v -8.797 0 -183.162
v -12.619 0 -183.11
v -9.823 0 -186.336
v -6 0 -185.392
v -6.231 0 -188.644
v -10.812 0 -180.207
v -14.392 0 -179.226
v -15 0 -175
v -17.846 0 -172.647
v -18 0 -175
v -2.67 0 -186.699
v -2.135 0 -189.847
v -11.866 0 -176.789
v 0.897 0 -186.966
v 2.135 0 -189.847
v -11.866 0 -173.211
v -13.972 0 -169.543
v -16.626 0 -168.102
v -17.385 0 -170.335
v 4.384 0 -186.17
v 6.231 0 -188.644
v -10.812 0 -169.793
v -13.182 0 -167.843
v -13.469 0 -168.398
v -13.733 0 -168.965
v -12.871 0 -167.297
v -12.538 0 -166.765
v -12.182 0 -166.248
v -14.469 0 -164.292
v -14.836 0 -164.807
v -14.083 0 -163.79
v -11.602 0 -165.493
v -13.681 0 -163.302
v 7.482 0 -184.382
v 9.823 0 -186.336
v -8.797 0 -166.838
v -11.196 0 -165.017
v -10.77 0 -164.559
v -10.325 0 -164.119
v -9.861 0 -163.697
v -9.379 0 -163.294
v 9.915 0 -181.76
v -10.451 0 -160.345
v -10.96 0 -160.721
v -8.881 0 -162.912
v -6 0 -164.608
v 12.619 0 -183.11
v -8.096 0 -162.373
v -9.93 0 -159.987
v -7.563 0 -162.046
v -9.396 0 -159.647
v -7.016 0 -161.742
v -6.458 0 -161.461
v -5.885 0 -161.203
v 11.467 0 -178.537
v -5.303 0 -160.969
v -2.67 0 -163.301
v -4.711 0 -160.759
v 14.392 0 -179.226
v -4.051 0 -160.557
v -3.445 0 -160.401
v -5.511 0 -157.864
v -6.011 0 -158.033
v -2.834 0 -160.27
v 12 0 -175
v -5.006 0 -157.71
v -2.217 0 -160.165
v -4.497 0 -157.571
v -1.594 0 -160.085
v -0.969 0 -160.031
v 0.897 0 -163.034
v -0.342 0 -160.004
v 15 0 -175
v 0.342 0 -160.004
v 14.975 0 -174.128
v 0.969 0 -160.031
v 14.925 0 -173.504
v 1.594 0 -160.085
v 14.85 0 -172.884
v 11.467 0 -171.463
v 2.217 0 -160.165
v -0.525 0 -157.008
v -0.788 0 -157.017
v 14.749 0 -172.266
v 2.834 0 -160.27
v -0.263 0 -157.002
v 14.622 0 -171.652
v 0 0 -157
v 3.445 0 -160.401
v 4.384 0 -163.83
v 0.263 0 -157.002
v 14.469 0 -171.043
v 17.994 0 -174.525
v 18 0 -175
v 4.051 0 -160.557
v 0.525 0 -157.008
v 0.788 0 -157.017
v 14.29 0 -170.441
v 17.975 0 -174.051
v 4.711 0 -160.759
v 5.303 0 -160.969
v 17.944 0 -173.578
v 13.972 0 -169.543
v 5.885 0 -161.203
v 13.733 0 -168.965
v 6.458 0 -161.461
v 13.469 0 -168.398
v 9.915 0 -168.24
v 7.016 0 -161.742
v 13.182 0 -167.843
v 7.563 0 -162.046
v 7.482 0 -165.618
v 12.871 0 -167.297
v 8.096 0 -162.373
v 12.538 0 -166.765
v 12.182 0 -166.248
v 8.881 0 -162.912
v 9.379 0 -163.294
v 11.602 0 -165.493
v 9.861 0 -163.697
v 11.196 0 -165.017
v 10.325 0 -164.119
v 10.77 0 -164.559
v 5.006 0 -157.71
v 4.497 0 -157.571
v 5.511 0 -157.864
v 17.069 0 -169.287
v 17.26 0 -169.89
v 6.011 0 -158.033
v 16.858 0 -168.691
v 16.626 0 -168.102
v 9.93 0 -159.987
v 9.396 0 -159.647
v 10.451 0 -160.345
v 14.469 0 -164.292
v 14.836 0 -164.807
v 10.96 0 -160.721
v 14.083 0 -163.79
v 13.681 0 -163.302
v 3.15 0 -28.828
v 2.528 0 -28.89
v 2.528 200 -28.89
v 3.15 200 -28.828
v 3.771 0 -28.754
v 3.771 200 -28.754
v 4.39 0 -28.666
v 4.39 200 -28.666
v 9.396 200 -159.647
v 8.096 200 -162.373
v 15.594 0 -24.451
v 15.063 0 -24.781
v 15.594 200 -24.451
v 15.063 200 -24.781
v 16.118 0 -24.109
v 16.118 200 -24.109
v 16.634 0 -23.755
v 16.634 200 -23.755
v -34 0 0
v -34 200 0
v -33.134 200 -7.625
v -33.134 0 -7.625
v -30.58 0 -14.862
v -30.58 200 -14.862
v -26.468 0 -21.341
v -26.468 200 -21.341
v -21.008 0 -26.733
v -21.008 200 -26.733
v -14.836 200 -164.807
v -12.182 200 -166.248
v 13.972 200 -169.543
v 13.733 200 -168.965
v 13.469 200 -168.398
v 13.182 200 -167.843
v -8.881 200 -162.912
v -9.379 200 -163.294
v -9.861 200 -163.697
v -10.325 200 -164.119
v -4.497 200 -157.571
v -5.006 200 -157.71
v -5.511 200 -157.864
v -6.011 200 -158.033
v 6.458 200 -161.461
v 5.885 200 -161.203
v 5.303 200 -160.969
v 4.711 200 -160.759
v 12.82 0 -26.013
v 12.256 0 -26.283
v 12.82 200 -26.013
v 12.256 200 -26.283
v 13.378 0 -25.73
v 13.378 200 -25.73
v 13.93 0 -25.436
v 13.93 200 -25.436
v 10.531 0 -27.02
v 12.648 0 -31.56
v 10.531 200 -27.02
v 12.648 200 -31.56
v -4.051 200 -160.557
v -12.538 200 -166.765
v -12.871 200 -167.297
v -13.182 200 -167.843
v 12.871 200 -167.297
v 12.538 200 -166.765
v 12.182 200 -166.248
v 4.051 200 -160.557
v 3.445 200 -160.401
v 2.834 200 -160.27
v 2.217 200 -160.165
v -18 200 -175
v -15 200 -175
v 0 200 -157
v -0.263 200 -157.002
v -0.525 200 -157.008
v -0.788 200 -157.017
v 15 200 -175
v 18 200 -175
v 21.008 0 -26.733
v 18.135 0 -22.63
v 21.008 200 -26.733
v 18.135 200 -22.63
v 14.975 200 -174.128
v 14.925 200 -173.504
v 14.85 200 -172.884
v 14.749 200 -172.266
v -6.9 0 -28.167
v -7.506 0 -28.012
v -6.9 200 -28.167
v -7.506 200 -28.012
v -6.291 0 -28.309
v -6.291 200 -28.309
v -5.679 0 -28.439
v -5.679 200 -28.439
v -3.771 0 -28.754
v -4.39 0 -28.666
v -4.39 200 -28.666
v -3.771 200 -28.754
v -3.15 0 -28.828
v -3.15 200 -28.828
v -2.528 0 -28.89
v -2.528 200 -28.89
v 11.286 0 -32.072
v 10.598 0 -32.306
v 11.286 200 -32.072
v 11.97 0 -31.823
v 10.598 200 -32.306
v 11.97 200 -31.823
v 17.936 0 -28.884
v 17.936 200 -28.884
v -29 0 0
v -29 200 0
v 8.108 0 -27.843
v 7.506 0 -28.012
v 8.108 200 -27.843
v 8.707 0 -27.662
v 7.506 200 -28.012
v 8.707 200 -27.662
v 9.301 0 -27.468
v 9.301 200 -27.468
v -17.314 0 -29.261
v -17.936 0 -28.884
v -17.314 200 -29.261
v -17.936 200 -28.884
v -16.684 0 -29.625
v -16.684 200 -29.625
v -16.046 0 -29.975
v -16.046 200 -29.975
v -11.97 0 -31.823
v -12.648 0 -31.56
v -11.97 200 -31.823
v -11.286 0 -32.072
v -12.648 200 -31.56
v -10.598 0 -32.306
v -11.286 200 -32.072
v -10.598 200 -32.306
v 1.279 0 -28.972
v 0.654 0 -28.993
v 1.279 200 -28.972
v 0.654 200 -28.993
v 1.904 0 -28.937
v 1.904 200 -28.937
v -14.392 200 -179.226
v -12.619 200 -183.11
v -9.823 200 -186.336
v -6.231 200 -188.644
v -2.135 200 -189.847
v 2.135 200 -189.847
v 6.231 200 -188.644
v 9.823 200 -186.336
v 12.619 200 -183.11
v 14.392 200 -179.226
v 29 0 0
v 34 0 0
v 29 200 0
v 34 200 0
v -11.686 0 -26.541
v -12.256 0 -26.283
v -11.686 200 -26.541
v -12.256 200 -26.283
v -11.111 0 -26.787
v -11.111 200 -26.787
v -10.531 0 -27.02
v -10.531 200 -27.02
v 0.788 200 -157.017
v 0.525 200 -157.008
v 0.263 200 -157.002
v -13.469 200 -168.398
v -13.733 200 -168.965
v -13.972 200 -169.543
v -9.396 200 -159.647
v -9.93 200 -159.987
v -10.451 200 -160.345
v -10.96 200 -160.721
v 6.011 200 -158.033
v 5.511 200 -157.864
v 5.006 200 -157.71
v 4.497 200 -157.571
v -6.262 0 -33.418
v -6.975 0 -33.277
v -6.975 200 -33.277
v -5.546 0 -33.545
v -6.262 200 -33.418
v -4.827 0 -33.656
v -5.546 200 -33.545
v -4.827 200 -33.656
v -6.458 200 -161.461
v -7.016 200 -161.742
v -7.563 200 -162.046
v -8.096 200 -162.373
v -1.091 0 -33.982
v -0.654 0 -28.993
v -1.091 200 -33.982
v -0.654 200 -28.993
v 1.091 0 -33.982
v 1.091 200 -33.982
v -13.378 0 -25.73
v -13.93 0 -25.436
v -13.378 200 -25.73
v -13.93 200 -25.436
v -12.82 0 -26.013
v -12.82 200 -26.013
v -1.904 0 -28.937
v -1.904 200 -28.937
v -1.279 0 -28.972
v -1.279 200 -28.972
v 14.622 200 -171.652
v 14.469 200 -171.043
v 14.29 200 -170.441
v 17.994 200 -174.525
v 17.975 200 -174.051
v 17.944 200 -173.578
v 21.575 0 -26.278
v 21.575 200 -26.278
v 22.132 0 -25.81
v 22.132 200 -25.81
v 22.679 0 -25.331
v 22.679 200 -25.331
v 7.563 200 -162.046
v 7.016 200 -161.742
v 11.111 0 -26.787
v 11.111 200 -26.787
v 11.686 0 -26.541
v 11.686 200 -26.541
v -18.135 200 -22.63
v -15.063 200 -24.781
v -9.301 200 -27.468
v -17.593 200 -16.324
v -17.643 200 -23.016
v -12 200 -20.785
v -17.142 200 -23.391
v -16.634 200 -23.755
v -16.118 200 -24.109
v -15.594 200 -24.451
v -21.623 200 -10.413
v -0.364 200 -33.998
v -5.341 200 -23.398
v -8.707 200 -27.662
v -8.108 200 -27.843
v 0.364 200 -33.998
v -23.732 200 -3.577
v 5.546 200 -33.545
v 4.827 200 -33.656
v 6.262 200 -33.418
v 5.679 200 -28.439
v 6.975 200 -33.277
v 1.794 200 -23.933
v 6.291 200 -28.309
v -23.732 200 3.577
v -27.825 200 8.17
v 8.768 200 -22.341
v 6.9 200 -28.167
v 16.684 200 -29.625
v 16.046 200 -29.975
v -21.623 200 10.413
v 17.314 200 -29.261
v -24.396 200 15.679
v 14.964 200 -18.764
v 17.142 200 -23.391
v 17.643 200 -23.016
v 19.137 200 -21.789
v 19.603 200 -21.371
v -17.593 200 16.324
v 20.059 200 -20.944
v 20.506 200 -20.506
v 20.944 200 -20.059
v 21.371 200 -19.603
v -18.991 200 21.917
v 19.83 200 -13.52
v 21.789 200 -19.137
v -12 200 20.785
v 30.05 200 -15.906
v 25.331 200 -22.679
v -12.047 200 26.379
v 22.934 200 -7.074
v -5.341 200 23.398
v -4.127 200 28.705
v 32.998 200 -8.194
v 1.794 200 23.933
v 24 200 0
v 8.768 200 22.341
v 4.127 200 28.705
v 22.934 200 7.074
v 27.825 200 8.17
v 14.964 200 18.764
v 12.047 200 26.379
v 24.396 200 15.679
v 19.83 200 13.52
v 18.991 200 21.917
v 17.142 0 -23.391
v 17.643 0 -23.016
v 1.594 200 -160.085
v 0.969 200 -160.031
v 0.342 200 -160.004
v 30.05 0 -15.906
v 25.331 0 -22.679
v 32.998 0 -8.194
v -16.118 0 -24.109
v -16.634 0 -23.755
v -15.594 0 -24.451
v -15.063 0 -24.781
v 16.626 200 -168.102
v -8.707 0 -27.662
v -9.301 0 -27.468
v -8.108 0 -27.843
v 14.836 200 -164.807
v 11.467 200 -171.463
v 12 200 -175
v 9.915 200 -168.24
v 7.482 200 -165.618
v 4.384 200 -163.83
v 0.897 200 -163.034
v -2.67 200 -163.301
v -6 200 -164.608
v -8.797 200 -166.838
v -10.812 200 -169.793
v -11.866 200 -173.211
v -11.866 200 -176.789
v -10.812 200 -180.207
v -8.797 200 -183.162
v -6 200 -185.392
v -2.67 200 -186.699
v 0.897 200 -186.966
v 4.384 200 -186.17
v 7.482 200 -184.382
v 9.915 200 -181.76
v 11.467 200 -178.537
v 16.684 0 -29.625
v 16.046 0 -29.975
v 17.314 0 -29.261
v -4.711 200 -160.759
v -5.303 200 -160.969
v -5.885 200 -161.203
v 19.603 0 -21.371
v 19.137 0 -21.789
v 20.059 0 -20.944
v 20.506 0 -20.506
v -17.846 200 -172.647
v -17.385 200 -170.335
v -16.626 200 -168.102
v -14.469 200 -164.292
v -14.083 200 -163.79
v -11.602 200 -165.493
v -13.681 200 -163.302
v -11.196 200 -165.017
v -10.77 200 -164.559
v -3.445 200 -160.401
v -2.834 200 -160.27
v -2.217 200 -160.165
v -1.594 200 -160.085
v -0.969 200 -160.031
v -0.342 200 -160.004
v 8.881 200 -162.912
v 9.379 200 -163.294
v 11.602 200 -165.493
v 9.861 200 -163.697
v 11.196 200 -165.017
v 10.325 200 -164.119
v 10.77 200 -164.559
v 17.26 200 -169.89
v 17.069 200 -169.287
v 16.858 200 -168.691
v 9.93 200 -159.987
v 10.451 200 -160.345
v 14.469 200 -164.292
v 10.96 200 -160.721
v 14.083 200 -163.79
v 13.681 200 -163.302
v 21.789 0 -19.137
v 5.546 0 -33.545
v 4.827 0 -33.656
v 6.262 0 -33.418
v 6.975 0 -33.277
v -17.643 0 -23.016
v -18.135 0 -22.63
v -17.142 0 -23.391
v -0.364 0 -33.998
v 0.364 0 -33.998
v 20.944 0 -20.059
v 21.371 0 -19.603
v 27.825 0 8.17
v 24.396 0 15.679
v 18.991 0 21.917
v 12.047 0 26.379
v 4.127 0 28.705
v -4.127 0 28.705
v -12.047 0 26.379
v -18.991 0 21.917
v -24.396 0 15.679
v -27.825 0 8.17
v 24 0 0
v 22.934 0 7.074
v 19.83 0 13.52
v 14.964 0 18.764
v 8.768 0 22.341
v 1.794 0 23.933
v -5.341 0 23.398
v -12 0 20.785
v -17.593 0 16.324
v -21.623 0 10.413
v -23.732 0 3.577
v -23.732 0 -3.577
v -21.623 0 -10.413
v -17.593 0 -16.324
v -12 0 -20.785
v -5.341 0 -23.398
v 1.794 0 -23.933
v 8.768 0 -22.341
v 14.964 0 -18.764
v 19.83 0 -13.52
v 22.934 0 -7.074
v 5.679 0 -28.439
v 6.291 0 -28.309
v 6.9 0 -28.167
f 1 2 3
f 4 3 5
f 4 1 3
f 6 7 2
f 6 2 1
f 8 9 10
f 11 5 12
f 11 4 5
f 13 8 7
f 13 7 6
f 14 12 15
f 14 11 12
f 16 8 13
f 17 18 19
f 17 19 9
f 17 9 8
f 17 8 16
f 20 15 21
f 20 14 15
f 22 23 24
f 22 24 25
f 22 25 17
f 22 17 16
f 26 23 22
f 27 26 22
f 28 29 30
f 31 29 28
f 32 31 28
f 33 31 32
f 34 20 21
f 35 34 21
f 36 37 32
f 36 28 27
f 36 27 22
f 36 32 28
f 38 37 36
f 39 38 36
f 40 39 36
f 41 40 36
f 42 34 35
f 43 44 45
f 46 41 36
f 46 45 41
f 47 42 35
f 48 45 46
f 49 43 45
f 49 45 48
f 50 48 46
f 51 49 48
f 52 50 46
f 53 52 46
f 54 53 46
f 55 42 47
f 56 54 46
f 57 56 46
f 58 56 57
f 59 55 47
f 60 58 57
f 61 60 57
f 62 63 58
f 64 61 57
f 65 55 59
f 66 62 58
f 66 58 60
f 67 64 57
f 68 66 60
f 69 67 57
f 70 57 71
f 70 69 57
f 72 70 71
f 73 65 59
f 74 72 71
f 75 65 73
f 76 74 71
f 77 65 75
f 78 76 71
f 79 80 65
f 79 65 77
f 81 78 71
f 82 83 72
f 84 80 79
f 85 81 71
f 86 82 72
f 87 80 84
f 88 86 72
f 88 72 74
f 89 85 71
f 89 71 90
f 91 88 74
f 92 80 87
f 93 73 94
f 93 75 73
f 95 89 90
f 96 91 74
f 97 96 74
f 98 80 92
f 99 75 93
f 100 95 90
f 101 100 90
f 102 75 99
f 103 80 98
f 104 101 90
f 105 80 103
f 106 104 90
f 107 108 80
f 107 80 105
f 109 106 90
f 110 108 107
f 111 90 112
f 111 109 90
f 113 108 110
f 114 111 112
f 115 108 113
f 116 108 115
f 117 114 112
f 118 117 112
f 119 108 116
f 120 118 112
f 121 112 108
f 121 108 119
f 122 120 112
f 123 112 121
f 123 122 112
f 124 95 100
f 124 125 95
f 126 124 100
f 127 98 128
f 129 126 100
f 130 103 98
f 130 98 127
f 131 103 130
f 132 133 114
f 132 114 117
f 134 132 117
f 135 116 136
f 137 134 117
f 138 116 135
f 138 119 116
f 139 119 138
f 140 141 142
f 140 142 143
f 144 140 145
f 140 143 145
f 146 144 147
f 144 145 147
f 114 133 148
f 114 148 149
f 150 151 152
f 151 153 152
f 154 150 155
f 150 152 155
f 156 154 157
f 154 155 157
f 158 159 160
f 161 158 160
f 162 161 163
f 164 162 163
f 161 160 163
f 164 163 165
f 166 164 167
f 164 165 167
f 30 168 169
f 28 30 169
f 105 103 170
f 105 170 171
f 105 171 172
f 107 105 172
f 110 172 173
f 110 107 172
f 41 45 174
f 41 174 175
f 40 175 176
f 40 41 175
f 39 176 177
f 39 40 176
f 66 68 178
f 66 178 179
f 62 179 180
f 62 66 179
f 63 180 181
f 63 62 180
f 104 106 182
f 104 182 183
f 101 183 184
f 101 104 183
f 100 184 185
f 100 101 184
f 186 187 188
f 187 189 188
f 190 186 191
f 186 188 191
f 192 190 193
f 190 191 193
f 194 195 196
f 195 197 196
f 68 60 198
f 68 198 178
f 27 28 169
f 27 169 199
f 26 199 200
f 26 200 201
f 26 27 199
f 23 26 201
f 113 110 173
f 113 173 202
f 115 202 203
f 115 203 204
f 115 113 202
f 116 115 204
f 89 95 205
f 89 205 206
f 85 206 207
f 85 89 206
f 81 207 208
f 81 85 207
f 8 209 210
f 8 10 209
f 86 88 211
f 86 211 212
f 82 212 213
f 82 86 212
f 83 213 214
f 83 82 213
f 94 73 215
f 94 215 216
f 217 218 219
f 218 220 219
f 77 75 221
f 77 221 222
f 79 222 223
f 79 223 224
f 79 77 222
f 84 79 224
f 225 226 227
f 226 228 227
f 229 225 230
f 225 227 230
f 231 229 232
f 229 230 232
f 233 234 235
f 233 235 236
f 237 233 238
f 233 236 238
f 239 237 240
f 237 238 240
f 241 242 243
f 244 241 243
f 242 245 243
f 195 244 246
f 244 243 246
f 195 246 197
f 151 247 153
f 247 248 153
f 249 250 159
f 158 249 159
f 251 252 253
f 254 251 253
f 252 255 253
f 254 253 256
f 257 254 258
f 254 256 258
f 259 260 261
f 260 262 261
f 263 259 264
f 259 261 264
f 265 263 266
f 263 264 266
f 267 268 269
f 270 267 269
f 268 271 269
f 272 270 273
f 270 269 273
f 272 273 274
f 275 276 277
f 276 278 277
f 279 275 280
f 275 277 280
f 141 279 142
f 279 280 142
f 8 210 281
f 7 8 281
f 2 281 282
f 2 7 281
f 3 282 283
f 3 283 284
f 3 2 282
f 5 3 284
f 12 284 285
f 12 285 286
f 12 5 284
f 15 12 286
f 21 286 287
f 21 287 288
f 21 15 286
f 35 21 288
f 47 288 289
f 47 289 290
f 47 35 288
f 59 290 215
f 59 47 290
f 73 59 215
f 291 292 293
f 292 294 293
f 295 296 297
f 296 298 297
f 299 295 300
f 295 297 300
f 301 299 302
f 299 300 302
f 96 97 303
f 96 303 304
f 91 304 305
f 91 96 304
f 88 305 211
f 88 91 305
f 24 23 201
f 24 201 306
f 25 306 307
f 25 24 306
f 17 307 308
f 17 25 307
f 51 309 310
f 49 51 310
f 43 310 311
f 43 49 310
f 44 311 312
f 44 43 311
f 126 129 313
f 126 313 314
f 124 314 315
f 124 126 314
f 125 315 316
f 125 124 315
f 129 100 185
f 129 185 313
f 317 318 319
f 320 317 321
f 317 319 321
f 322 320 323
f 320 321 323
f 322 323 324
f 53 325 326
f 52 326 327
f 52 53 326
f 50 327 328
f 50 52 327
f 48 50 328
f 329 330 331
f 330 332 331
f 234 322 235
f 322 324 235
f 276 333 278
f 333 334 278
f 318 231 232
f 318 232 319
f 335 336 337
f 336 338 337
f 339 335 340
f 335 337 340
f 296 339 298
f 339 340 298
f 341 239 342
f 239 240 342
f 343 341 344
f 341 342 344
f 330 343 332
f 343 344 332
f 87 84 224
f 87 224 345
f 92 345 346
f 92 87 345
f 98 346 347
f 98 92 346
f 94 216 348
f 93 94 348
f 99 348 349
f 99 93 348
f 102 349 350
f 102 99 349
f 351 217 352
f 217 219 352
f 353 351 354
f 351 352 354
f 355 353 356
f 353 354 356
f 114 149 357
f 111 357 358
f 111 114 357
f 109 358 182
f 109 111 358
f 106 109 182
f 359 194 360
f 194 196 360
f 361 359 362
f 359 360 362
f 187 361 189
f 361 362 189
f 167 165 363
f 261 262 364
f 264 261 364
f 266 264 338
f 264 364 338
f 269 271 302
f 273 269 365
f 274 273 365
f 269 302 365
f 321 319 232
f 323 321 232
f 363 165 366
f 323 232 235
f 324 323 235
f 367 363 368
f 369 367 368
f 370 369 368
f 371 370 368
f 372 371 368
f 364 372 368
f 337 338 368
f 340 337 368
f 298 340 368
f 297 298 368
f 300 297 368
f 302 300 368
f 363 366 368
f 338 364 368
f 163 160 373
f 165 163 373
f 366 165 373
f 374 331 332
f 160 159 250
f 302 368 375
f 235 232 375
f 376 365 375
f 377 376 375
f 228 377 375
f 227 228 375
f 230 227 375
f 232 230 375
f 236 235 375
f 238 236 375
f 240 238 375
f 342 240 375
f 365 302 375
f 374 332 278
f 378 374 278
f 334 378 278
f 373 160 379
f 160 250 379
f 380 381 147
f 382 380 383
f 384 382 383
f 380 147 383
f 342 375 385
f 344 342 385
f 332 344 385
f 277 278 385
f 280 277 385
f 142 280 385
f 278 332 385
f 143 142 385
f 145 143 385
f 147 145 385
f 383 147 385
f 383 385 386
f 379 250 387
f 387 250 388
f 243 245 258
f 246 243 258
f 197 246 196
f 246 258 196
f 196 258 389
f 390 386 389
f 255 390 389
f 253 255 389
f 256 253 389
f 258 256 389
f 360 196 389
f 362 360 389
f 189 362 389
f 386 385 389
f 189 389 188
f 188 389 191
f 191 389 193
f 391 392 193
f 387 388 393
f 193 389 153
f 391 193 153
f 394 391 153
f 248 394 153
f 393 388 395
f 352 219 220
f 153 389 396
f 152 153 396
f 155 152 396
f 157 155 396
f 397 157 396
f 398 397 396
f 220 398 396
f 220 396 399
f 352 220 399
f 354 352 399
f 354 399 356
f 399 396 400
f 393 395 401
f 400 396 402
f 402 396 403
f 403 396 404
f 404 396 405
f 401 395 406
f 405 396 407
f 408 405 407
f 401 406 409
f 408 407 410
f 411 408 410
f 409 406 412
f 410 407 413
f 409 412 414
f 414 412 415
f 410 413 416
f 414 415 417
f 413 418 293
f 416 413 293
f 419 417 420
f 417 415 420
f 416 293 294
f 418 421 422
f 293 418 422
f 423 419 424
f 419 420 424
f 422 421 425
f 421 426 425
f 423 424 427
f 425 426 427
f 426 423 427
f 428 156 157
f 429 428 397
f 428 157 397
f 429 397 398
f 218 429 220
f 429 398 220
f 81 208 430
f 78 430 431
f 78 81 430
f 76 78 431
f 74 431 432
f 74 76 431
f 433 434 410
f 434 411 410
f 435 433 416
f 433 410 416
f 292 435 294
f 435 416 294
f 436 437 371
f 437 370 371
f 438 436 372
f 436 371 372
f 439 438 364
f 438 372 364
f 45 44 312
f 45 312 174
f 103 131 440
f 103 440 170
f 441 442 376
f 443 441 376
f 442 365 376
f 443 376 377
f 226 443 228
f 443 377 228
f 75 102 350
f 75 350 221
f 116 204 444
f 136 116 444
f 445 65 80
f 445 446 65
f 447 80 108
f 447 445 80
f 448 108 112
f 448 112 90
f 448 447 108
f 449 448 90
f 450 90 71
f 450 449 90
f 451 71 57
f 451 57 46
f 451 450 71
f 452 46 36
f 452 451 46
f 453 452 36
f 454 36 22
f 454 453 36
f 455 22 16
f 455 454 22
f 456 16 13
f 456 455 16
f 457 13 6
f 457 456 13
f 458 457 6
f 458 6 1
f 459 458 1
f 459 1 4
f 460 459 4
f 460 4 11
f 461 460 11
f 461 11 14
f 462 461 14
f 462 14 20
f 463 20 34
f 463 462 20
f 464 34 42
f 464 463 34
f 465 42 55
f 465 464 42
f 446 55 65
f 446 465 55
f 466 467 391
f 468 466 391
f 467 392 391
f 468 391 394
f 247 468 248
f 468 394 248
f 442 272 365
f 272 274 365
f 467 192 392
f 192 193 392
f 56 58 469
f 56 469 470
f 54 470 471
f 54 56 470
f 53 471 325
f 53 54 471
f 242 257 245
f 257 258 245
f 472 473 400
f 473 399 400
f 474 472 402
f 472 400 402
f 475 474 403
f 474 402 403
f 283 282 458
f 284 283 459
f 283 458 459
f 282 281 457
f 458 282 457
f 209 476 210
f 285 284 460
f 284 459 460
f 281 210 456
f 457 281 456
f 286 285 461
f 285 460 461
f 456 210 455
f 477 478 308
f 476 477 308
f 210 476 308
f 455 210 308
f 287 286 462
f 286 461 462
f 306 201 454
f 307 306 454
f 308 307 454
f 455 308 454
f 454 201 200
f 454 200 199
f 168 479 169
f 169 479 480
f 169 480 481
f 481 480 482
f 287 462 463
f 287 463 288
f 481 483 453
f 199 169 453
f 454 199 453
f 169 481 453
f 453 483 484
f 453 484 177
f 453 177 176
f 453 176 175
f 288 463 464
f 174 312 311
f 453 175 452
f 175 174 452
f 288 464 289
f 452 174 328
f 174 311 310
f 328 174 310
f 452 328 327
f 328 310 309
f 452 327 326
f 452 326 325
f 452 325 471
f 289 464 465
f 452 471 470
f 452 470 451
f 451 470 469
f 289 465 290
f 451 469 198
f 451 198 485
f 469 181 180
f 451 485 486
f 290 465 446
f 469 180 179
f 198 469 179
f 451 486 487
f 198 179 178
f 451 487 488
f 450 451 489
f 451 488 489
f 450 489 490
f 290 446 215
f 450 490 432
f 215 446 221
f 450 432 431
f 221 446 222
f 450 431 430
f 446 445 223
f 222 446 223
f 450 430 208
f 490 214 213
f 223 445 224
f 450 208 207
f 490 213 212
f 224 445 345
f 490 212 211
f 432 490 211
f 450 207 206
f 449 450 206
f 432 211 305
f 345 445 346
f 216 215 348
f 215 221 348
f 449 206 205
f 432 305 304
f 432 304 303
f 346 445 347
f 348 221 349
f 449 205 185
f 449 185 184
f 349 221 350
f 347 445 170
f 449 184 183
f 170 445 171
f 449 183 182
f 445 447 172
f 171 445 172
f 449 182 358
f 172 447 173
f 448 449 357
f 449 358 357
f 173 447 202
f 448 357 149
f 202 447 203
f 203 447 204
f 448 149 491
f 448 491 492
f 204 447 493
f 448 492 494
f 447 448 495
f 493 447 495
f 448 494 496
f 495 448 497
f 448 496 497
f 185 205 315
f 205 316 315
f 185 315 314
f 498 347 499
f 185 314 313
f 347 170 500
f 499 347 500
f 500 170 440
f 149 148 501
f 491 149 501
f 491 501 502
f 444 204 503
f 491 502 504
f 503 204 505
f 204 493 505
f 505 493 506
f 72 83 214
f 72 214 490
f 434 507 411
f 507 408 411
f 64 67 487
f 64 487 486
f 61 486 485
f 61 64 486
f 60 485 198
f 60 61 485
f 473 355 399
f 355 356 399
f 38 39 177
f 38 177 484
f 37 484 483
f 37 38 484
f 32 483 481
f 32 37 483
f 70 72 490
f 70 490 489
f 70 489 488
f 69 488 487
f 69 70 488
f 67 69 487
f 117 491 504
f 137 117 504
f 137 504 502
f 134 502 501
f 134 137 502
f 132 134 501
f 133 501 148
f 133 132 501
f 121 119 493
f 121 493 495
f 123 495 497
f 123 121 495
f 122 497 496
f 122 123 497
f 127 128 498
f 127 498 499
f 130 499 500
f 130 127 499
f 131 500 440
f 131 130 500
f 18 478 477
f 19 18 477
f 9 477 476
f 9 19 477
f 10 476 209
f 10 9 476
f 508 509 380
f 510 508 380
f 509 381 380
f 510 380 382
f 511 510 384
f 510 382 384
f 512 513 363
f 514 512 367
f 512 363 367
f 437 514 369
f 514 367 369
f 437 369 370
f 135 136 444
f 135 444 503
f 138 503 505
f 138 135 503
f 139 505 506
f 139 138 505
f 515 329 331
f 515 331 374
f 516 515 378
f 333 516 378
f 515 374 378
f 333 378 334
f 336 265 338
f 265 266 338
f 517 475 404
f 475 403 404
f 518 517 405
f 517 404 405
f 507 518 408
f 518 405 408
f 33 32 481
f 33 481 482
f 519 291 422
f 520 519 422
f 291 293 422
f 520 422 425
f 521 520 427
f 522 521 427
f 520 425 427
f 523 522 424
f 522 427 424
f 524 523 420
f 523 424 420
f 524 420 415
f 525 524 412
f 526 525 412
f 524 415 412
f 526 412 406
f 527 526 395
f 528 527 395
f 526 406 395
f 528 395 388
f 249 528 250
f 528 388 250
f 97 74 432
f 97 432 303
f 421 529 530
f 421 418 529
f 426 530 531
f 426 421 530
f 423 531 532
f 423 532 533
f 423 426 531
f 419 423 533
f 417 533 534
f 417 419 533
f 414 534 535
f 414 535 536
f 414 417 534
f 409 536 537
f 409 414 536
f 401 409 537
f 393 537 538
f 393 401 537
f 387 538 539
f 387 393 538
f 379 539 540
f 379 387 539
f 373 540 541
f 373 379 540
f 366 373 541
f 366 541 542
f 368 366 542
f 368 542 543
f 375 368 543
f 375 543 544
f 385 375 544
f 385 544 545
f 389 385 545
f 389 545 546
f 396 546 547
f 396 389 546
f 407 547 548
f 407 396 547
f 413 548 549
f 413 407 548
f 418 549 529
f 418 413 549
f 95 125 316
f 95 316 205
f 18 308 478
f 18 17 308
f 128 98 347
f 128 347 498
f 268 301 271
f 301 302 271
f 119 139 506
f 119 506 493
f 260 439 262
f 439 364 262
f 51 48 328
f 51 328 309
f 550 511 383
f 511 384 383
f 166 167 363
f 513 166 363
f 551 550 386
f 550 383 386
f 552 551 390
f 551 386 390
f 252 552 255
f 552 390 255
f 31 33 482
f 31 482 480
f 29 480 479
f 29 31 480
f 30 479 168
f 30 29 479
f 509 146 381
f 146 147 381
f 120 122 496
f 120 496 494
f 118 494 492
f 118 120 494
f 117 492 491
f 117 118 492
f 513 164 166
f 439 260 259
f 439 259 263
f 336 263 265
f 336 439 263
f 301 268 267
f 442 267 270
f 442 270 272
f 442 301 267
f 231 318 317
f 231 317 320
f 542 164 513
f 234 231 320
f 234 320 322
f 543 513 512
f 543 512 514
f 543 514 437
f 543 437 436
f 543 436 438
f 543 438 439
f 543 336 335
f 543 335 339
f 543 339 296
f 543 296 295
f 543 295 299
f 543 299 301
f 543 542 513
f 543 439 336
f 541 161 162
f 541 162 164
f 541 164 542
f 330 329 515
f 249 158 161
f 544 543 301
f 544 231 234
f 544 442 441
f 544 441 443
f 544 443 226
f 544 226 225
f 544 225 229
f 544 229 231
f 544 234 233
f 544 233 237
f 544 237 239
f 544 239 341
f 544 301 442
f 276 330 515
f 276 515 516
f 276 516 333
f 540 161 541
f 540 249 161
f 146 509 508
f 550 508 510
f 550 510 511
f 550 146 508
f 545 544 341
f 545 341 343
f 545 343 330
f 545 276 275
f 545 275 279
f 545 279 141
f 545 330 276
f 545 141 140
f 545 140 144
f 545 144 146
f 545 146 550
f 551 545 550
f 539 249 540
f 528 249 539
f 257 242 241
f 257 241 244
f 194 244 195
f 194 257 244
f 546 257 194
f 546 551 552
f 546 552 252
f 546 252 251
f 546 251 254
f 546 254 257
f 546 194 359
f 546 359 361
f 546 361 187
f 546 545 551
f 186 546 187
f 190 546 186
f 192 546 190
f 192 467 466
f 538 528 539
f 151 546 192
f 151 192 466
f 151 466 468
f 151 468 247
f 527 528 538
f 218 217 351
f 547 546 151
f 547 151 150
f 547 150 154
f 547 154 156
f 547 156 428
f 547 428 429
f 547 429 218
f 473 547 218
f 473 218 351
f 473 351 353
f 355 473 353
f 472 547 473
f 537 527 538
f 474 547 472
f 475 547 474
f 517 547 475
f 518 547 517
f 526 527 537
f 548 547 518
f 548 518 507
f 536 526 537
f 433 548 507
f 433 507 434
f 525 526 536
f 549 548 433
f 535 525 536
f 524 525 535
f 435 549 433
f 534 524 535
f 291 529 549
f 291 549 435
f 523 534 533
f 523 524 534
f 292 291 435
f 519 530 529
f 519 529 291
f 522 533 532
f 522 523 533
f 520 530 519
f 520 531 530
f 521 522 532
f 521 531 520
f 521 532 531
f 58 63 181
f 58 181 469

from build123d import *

# Parameters (mm, degrees)
F1_R     = 24
F1_R_2   = 12
F2_DEPTH = 100


with BuildPart() as f2:
    # F1 (on offset) → F2 (new body, symmetric)
    with BuildSketch(Plane.XZ.offset(-100)):
        with BuildLine():
            Line((-21.007832, -26.733331), (-18.134823, -22.630249))
            ThreePointArc((-18.134823, -22.630249), (-17.393371, -23.204971), (-16.633717, -23.755409))
            ThreePointArc((-16.633717, -23.755409), (-15.856656, -24.280989), (-15.063003, -24.781161))
            ThreePointArc((-15.063003, -24.781161), (-14.5, -25.114737), (-13.929613, -25.435524))
            ThreePointArc((-13.929613, -25.435524), (-13.099625, -25.872762), (-12.25593, -26.282926))
            ThreePointArc((-12.25593, -26.282926), (-11.399409, -26.665586), (-10.530959, -27.020342))
            ThreePointArc((-10.530959, -27.020342), (-9.918584, -27.251086), (-9.301159, -27.467953))
            ThreePointArc((-9.301159, -27.467953), (-8.407855, -27.754423), (-7.505752, -28.011849))
            ThreePointArc((-7.505752, -28.011849), (-6.595796, -28.239962), (-5.678937, -28.438525))
            ThreePointArc((-5.678937, -28.438525), (-5.035797, -28.559425), (-4.390093, -28.665782))
            ThreePointArc((-4.390093, -28.665782), (-3.460616, -28.792779), (-2.527517, -28.889646))
            ThreePointArc((-2.527517, -28.889646), (-1.591773, -28.956282), (-0.654363, -28.992616))
            ThreePointArc((-0.654363, -28.992616), (0, -29), (0.654363, -28.992616))
            ThreePointArc((0.654363, -28.992616), (1.591773, -28.956282), (2.527517, -28.889646))
            ThreePointArc((2.527517, -28.889646), (3.460616, -28.792779), (4.390093, -28.665782))
            ThreePointArc((4.390093, -28.665782), (5.035797, -28.559425), (5.678937, -28.438525))
            ThreePointArc((5.678937, -28.438525), (6.595796, -28.239962), (7.505752, -28.011849))
            ThreePointArc((7.505752, -28.011849), (8.407855, -27.754423), (9.301159, -27.467953))
            ThreePointArc((9.301159, -27.467953), (9.918584, -27.251086), (10.530959, -27.020342))
            ThreePointArc((10.530959, -27.020342), (11.399409, -26.665586), (12.25593, -26.282926))
            ThreePointArc((12.25593, -26.282926), (13.099625, -25.872762), (13.929613, -25.435524))
            ThreePointArc((13.929613, -25.435524), (14.5, -25.114737), (15.063003, -24.781161))
            ThreePointArc((15.063003, -24.781161), (15.856656, -24.280989), (16.633717, -23.755409))
            ThreePointArc((16.633717, -23.755409), (17.393371, -23.204971), (18.134823, -22.630249))
            ThreePointArc((18.134823, -22.630249), (18.640841, -22.215289), (19.137366, -21.789016))
            ThreePointArc((19.137366, -21.789016), (19.832108, -21.158627), (20.506097, -20.506097))
            ThreePointArc((20.506097, -20.506097), (21.158627, -19.832108), (21.789016, -19.137366))
            Line((21.789016, -19.137366), (25.33087, -22.67922))
            ThreePointArc((25.33087, -22.67922), (31.758854, -12.139819), (34, 0))
            Line((34, 0), (29, 0))
            ThreePointArc((29, 0), (0, 29), (-29, 0))
            Line((-29, 0), (-34, 0))
            ThreePointArc((-34, 0), (-30.579947, -14.86159), (-21.007832, -26.733331))
        make_face()
        Circle(F1_R, mode=Mode.SUBTRACT)
        with BuildLine():
            ThreePointArc((-13.929613, -25.435524), (-14.5, -25.114737), (-15.063003, -24.781161))
            Line((-15.063003, -24.781161), (-17.936012, -28.884243))
            ThreePointArc((-17.936012, -28.884243), (-17, -29.444864), (-16.046482, -29.975163))
            Line((-16.046482, -29.975163), (-13.929613, -25.435524))
        make_face()
        with BuildLine():
            ThreePointArc((-9.301159, -27.467953), (-9.918584, -27.251086), (-10.530959, -27.020342))
            Line((-10.530959, -27.020342), (-12.647828, -31.559982))
            ThreePointArc((-12.647828, -31.559982), (-11.628685, -31.949549), (-10.597567, -32.306216))
            Line((-10.597567, -32.306216), (-9.301159, -27.467953))
        make_face()
        with BuildLine():
            ThreePointArc((-4.390093, -28.665782), (-5.035797, -28.559425), (-5.678937, -28.438525))
            Line((-5.678937, -28.438525), (-6.975345, -33.276787))
            ThreePointArc((-6.975345, -33.276787), (-5.904038, -33.483464), (-4.826651, -33.65566))
            Line((-4.826651, -33.65566), (-4.390093, -28.665782))
        make_face()
        with BuildLine():
            ThreePointArc((0.654363, -28.992616), (0, -29), (-0.654363, -28.992616))
            Line((-0.654363, -28.992616), (-1.090921, -33.982494))
            ThreePointArc((-1.090921, -33.982494), (0, -34), (1.090921, -33.982494))
            Line((1.090921, -33.982494), (0.654363, -28.992616))
        make_face()
        with BuildLine():
            ThreePointArc((5.678937, -28.438525), (5.035797, -28.559425), (4.390093, -28.665782))
            Line((4.390093, -28.665782), (4.826651, -33.65566))
            ThreePointArc((4.826651, -33.65566), (5.904038, -33.483464), (6.975345, -33.276787))
            Line((6.975345, -33.276787), (5.678937, -28.438525))
        make_face()
        with BuildLine():
            Line((12.647828, -31.559982), (10.530959, -27.020342))
            ThreePointArc((10.530959, -27.020342), (9.918584, -27.251086), (9.301159, -27.467953))
            Line((9.301159, -27.467953), (10.597567, -32.306216))
            ThreePointArc((10.597567, -32.306216), (11.628685, -31.949549), (12.647828, -31.559982))
        make_face()
        with BuildLine():
            Line((17.936012, -28.884243), (15.063003, -24.781161))
            ThreePointArc((15.063003, -24.781161), (14.5, -25.114737), (13.929613, -25.435524))
            Line((13.929613, -25.435524), (16.046482, -29.975163))
            ThreePointArc((16.046482, -29.975163), (17, -29.444864), (17.936012, -28.884243))
        make_face()
        with BuildLine():
            Line((22.67922, -25.33087), (19.137366, -21.789016))
            ThreePointArc((19.137366, -21.789016), (18.640841, -22.215289), (18.134823, -22.630249))
            Line((18.134823, -22.630249), (21.007832, -26.733331))
            ThreePointArc((21.007832, -26.733331), (21.854779, -26.045511), (22.67922, -25.33087))
        make_face()
        with BuildLine():
            Line((-18, -175), (-15, -175))
            ThreePointArc((-15, -175), (-14.740809, -172.223573), (-13.972194, -169.543096))
            Line((-13.972194, -169.543096), (-16.625913, -168.102245))
            ThreePointArc((-16.625913, -168.102245), (-17.653136, -171.483356), (-18, -175))
        make_face()
        with BuildLine():
            Line((-14.835892, -164.807047), (-12.182037, -166.247973))
            ThreePointArc((-12.182037, -166.247973), (-11.898051, -165.865648), (-11.60207, -165.492531))
            Line((-11.60207, -165.492531), (-13.680659, -163.302155))
            ThreePointArc((-13.680659, -163.302155), (-14.278116, -164.03937), (-14.835892, -164.807047))
        make_face()
        with BuildLine():
            ThreePointArc((-8.88128, -162.911871), (-8.493048, -162.636015), (-8.096255, -162.372623))
            Line((-8.096255, -162.372623), (-9.396247, -159.647132))
            ThreePointArc((-9.396247, -159.647132), (-10.192275, -160.163641), (-10.959976, -160.721383))
            Line((-10.959976, -160.721383), (-8.88128, -162.911871))
        make_face()
        with BuildLine():
            ThreePointArc((13.972194, -169.543096), (13.603821, -168.680503), (13.182257, -167.842619))
            ThreePointArc((13.182257, -167.842619), (12.707186, -167.02959), (12.182037, -166.247973))
            ThreePointArc((12.182037, -166.247973), (11.898051, -165.865648), (11.60207, -165.492531))
            ThreePointArc((11.60207, -165.492531), (10.985171, -164.785989), (10.325319, -164.119384))
            ThreePointArc((10.325319, -164.119384), (9.62226, -163.492954), (8.88128, -162.911871))
            ThreePointArc((8.88128, -162.911871), (8.493048, -162.636015), (8.096255, -162.372623))
            ThreePointArc((8.096255, -162.372623), (7.291215, -161.891294), (6.457666, -161.461221))
            ThreePointArc((6.457666, -161.461221), (5.59544, -161.082707), (4.711162, -160.75904))
            ThreePointArc((4.711162, -160.75904), (4.382042, -160.654349), (4.050599, -160.557263))
            ThreePointArc((4.050599, -160.557263), (3.140009, -160.332337), (2.217141, -160.164762))
            ThreePointArc((2.217141, -160.164762), (1.281923, -160.054878), (0.341653, -160.003891))
            ThreePointArc((0.341653, -160.003891), (0, -160), (-0.341653, -160.003891))
            ThreePointArc((-0.341653, -160.003891), (-1.281923, -160.054878), (-2.217141, -160.164762))
            ThreePointArc((-2.217141, -160.164762), (-3.140009, -160.332337), (-4.050599, -160.557263))
            ThreePointArc((-4.050599, -160.557263), (-4.382042, -160.654349), (-4.711162, -160.75904))
            ThreePointArc((-4.711162, -160.75904), (-5.59544, -161.082707), (-6.457666, -161.461221))
            ThreePointArc((-6.457666, -161.461221), (-7.291215, -161.891294), (-8.096255, -162.372623))
            ThreePointArc((-8.096255, -162.372623), (-8.493048, -162.636015), (-8.88128, -162.911871))
            ThreePointArc((-8.88128, -162.911871), (-9.62226, -163.492954), (-10.325319, -164.119384))
            ThreePointArc((-10.325319, -164.119384), (-10.985171, -164.785989), (-11.60207, -165.492531))
            ThreePointArc((-11.60207, -165.492531), (-11.898051, -165.865648), (-12.182037, -166.247973))
            ThreePointArc((-12.182037, -166.247973), (-12.707186, -167.02959), (-13.182257, -167.842619))
            ThreePointArc((-13.182257, -167.842619), (-13.603821, -168.680503), (-13.972194, -169.543096))
            ThreePointArc((-13.972194, -169.543096), (-14.740809, -172.223573), (-15, -175))
            ThreePointArc((-15, -175), (0, -190), (15, -175))
            ThreePointArc((15, -175), (14.993654, -174.563726), (14.974622, -174.127821))
            ThreePointArc((14.974622, -174.127821), (14.890835, -173.193613), (14.748824, -172.266467))
            ThreePointArc((14.748824, -172.266467), (14.548244, -171.346426), (14.290331, -170.440784))
            ThreePointArc((14.290331, -170.440784), (14.138389, -169.989415), (13.972194, -169.543096))
        make_face()
        with Locations((0, -175)):
            Circle(F1_R_2, mode=Mode.SUBTRACT)
        with BuildLine():
            ThreePointArc((-4.711162, -160.75904), (-4.382042, -160.654349), (-4.050599, -160.557263))
            Line((-4.050599, -160.557263), (-4.496932, -157.570783))
            ThreePointArc((-4.496932, -157.570783), (-5.259166, -157.785437), (-6.011222, -158.033409))
            Line((-6.011222, -158.033409), (-4.711162, -160.75904))
        make_face()
        with BuildLine():
            ThreePointArc((-0.341653, -160.003891), (0, -160), (0.341653, -160.003891))
            Line((0.341653, -160.003891), (0.788009, -157.017257))
            ThreePointArc((0.788009, -157.017257), (0.394099, -157.004315), (0, -157))
            ThreePointArc((0, -157), (-0.394099, -157.004315), (-0.788009, -157.017257))
            Line((-0.788009, -157.017257), (-0.341653, -160.003891))
        make_face()
        with BuildLine():
            Line((4.496932, -157.570783), (4.050599, -160.557263))
            ThreePointArc((4.050599, -160.557263), (4.382042, -160.654349), (4.711162, -160.75904))
            Line((4.711162, -160.75904), (6.011222, -158.033409))
            ThreePointArc((6.011222, -158.033409), (5.259166, -157.785437), (4.496932, -157.570783))
        make_face()
        with BuildLine():
            ThreePointArc((8.096255, -162.372623), (8.493048, -162.636015), (8.88128, -162.911871))
            Line((8.88128, -162.911871), (10.959976, -160.721383))
            ThreePointArc((10.959976, -160.721383), (10.192275, -160.163641), (9.396247, -159.647132))
            Line((9.396247, -159.647132), (8.096255, -162.372623))
        make_face()
        with BuildLine():
            ThreePointArc((11.60207, -165.492531), (11.898051, -165.865648), (12.182037, -166.247973))
            Line((12.182037, -166.247973), (14.835892, -164.807047))
            ThreePointArc((14.835892, -164.807047), (14.278116, -164.03937), (13.680659, -163.302155))
            Line((13.680659, -163.302155), (11.60207, -165.492531))
        make_face()
        with BuildLine():
            Line((16.625913, -168.102245), (13.972194, -169.543096))
            ThreePointArc((13.972194, -169.543096), (14.138389, -169.989415), (14.290331, -170.440784))
            Line((14.290331, -170.440784), (17.259568, -169.890468))
            ThreePointArc((17.259568, -169.890468), (16.966316, -168.988002), (16.625913, -168.102245))
        make_face()
        with BuildLine():
            Line((17.943706, -173.577534), (14.974622, -174.127821))
            ThreePointArc((14.974622, -174.127821), (14.993654, -174.563726), (15, -175))
            Line((15, -175), (18, -175))
            ThreePointArc((18, -175), (17.985921, -174.28821), (17.943706, -173.577534))
        make_face()
    extrude(amount=F2_DEPTH, both=True)


solid = f2.part
